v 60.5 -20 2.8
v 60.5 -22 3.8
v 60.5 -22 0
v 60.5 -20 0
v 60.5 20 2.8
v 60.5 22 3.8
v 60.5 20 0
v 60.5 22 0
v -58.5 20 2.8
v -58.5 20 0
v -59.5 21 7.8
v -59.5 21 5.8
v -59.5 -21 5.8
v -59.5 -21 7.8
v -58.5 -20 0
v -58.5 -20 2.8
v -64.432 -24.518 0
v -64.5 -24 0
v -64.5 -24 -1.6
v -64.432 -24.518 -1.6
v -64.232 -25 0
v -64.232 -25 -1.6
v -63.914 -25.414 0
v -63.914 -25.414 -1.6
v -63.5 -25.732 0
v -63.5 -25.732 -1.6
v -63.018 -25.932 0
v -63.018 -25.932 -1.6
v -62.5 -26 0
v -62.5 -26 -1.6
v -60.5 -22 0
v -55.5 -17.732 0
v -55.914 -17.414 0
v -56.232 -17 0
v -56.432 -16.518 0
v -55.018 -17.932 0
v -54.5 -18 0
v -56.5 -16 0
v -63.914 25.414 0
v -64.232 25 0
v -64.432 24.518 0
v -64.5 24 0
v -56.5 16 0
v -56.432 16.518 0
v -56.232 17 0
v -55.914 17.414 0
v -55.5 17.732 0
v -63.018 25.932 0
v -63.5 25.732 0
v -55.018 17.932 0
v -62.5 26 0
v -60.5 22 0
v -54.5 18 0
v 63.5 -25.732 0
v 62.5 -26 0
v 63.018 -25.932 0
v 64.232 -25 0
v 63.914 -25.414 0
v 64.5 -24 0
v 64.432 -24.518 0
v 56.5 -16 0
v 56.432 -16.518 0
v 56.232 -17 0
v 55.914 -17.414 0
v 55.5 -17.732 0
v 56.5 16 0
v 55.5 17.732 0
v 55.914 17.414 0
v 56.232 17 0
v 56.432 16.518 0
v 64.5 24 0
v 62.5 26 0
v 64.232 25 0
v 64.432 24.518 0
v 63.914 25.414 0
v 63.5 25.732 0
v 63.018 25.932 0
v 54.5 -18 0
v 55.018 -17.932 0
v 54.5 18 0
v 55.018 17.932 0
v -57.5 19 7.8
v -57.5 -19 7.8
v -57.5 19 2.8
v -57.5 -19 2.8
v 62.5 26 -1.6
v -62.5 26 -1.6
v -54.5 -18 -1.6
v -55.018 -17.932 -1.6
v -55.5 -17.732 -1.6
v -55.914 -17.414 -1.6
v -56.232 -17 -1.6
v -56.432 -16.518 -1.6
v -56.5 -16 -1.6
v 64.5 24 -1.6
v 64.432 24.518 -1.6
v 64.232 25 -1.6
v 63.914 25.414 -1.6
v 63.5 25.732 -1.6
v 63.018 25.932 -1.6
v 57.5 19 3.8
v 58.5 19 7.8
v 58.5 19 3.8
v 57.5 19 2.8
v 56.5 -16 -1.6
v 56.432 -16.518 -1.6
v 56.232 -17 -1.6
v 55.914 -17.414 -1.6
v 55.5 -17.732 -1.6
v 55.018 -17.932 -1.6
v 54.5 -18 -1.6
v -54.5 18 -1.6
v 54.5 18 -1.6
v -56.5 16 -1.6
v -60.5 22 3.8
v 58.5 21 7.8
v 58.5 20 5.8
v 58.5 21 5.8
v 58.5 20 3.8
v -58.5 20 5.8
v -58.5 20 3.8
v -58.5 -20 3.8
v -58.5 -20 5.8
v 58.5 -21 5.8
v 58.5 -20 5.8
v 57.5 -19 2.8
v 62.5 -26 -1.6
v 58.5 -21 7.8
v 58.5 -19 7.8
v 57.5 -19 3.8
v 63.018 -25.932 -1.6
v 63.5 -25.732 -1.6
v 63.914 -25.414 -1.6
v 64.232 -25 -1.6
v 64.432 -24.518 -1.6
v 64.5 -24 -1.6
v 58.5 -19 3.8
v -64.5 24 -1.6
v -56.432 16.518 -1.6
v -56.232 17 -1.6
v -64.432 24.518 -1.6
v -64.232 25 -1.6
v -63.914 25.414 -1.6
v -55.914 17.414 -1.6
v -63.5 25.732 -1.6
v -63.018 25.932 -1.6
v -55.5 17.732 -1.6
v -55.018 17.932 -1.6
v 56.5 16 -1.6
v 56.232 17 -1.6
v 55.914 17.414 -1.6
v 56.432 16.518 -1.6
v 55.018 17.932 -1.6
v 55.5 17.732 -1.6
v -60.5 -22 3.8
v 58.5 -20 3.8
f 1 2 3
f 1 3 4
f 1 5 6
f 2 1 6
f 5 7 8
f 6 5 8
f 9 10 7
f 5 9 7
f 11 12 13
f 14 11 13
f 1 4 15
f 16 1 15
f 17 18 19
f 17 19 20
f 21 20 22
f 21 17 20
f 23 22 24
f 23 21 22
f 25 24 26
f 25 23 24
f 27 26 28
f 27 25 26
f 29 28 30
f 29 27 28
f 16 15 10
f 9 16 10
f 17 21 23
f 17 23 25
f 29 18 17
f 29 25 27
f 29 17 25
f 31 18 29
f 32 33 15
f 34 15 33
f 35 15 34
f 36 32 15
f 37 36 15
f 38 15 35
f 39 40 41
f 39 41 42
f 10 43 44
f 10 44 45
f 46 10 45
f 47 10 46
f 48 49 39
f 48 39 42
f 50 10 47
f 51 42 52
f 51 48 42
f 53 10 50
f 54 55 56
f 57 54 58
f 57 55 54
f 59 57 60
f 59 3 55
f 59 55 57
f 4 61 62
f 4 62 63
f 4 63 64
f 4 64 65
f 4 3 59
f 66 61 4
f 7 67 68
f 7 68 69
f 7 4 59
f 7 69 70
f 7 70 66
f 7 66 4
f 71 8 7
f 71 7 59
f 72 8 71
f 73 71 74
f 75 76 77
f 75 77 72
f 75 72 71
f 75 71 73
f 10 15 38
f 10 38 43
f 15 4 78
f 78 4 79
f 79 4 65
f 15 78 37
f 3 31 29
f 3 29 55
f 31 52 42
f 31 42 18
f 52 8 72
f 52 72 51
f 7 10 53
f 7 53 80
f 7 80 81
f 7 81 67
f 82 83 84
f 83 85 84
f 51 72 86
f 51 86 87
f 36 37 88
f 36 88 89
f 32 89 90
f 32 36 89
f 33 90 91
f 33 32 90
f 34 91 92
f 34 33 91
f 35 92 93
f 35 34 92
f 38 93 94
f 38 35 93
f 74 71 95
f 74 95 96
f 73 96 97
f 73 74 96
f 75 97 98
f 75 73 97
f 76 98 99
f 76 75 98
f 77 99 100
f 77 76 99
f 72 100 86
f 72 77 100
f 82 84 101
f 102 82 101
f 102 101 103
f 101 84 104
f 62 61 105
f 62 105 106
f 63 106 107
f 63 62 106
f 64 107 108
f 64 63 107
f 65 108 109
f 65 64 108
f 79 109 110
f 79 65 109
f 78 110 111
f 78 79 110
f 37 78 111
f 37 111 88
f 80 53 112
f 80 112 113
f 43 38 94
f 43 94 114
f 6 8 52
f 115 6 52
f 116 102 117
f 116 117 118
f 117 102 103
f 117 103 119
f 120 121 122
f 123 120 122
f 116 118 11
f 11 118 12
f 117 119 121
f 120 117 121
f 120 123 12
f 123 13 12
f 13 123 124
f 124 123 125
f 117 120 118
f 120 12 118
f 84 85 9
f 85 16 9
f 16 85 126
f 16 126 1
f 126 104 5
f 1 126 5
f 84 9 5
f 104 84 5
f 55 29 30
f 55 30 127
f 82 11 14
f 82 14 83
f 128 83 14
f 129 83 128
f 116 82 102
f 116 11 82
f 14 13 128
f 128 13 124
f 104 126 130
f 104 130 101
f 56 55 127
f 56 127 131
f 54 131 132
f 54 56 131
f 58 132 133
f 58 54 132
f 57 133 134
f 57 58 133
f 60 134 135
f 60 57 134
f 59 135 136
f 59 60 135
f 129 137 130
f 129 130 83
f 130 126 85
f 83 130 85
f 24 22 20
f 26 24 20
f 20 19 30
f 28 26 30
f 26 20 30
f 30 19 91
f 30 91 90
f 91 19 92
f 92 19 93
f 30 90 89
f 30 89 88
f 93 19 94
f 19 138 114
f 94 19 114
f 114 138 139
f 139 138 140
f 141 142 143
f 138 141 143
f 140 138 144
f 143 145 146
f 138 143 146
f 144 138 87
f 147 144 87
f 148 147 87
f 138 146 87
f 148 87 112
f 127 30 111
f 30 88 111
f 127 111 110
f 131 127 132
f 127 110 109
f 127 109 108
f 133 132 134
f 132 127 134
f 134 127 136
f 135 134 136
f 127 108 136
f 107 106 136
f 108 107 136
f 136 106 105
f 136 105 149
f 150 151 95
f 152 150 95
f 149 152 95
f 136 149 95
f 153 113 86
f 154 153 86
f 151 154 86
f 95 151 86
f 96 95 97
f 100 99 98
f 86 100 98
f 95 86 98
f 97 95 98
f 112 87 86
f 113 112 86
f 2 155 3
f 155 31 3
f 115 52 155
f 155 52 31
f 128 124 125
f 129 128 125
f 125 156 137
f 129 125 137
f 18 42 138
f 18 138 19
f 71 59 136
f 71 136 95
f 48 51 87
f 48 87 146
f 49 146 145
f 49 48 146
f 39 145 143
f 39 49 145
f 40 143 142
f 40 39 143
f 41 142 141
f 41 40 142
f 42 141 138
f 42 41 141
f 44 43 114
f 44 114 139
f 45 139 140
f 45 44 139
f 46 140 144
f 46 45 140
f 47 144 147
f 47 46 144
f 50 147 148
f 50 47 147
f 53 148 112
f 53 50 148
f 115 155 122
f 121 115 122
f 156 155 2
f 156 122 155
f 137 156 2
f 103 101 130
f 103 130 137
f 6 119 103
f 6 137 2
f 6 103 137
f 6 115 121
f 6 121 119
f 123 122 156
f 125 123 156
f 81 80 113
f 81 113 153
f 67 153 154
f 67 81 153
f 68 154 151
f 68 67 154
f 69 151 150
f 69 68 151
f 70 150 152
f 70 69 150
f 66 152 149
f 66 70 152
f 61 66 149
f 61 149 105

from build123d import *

# Parameters (mm, degrees)
F0_W     = 117
F0_H     = 40
F0_W_2   = 2
F1_DEPTH = 1.6
F2_DEPTH = 2.8
F3_W     = 119
F3_H     = 40
F3_W_2   = 115
F3_H_2   = 38
F4_DEPTH = 1
F6_DEPTH = 2
F8_DEPTH = 2


with BuildPart() as f1:
    # F0 (on Top) → F1 (new body)
    with BuildSketch(Plane.XY):
        with BuildLine():
            Line((62.5, 26), (-62.5, 26))
            ThreePointArc((-62.5, 26), (-63.914214, 25.414214), (-64.5, 24))
            Line((-64.5, 24), (-64.5, -24))
            ThreePointArc((-64.5, -24), (-63.914214, -25.414214), (-62.5, -26))
            Line((-62.5, -26), (62.5, -26))
            ThreePointArc((62.5, -26), (63.914214, -25.414214), (64.5, -24))
            Line((64.5, -24), (64.5, 24))
            ThreePointArc((64.5, 24), (63.914214, 25.414214), (62.5, 26))
        make_face()
        Polygon((60.5, 22), (60.5, 20), (60.5, -20), (60.5, -22), (-60.5, -22), (-60.5, 22), align=None, mode=Mode.SUBTRACT)
        Polygon((-58.5, -20), (-58.5, 20), (58.5, 20), (60.5, 20), (60.5, 22), (-60.5, 22), (-60.5, -22), (60.5, -22), (60.5, -20), (58.5, -20), align=None)
        Rectangle(F0_W, F0_H)
        with BuildLine():
            ThreePointArc((-56.5, 16), (-55.914214, 17.414214), (-54.5, 18))
            Line((-54.5, 18), (54.5, 18))
            ThreePointArc((54.5, 18), (55.914214, 17.414214), (56.5, 16))
            Line((56.5, 16), (56.5, -16))
            ThreePointArc((56.5, -16), (55.914214, -17.414214), (54.5, -18))
            Line((54.5, -18), (-54.5, -18))
            ThreePointArc((-54.5, -18), (-55.914214, -17.414214), (-56.5, -16))
            Line((-56.5, -16), (-56.5, 16))
        make_face(mode=Mode.SUBTRACT)
        with Locations((59.5, 0)):
            Rectangle(F0_W_2, F0_H)
    extrude(amount=-F1_DEPTH)

    # F0 (on Top) → F2 (join)
    with BuildSketch(Plane.XY):
        Polygon((-58.5, -20), (-58.5, 20), (58.5, 20), (60.5, 20), (60.5, 22), (-60.5, 22), (-60.5, -22), (60.5, -22), (60.5, -20), (58.5, -20), align=None)
    extrude(amount=F2_DEPTH)

    # F3 (on face) → F4 (join)
    with BuildSketch(Plane.XY.offset(2.8)):
        Polygon((60.5, 22), (-60.5, 22), (-60.5, -22), (60.5, -22), (60.5, -20), (-58.5, -20), (-58.5, 20), (60.5, 20), align=None)
        with Locations((1, 0)):
            Rectangle(F3_W, F3_H)
        Rectangle(F3_W_2, F3_H_2, mode=Mode.SUBTRACT)
    extrude(amount=F4_DEPTH)

    # F5 (on face) → F6 (join)
    with BuildSketch(Plane.XY.offset(3.8)):
        Polygon((-57.5, -19), (-57.5, 19), (57.5, 19), (58.5, 19), (58.5, 20), (-58.5, 20), (-58.5, -20), (58.5, -20), (58.5, -19), (57.5, -19), align=None)
    extrude(amount=F6_DEPTH)

    # F7 (on face) → F8 (join)
    with BuildSketch(Plane.XY.offset(5.8)):
        Polygon((-58.5, 20), (58.5, 20), (58.5, 21), (-59.5, 21), (-59.5, -21), (58.5, -21), (58.5, -20), (-58.5, -20), align=None)
        Polygon((-57.5, -19), (-57.5, 19), (57.5, 19), (58.5, 19), (58.5, 20), (-58.5, 20), (-58.5, -20), (58.5, -20), (58.5, -19), (57.5, -19), align=None)
    extrude(amount=F8_DEPTH)


solid = f1.part
